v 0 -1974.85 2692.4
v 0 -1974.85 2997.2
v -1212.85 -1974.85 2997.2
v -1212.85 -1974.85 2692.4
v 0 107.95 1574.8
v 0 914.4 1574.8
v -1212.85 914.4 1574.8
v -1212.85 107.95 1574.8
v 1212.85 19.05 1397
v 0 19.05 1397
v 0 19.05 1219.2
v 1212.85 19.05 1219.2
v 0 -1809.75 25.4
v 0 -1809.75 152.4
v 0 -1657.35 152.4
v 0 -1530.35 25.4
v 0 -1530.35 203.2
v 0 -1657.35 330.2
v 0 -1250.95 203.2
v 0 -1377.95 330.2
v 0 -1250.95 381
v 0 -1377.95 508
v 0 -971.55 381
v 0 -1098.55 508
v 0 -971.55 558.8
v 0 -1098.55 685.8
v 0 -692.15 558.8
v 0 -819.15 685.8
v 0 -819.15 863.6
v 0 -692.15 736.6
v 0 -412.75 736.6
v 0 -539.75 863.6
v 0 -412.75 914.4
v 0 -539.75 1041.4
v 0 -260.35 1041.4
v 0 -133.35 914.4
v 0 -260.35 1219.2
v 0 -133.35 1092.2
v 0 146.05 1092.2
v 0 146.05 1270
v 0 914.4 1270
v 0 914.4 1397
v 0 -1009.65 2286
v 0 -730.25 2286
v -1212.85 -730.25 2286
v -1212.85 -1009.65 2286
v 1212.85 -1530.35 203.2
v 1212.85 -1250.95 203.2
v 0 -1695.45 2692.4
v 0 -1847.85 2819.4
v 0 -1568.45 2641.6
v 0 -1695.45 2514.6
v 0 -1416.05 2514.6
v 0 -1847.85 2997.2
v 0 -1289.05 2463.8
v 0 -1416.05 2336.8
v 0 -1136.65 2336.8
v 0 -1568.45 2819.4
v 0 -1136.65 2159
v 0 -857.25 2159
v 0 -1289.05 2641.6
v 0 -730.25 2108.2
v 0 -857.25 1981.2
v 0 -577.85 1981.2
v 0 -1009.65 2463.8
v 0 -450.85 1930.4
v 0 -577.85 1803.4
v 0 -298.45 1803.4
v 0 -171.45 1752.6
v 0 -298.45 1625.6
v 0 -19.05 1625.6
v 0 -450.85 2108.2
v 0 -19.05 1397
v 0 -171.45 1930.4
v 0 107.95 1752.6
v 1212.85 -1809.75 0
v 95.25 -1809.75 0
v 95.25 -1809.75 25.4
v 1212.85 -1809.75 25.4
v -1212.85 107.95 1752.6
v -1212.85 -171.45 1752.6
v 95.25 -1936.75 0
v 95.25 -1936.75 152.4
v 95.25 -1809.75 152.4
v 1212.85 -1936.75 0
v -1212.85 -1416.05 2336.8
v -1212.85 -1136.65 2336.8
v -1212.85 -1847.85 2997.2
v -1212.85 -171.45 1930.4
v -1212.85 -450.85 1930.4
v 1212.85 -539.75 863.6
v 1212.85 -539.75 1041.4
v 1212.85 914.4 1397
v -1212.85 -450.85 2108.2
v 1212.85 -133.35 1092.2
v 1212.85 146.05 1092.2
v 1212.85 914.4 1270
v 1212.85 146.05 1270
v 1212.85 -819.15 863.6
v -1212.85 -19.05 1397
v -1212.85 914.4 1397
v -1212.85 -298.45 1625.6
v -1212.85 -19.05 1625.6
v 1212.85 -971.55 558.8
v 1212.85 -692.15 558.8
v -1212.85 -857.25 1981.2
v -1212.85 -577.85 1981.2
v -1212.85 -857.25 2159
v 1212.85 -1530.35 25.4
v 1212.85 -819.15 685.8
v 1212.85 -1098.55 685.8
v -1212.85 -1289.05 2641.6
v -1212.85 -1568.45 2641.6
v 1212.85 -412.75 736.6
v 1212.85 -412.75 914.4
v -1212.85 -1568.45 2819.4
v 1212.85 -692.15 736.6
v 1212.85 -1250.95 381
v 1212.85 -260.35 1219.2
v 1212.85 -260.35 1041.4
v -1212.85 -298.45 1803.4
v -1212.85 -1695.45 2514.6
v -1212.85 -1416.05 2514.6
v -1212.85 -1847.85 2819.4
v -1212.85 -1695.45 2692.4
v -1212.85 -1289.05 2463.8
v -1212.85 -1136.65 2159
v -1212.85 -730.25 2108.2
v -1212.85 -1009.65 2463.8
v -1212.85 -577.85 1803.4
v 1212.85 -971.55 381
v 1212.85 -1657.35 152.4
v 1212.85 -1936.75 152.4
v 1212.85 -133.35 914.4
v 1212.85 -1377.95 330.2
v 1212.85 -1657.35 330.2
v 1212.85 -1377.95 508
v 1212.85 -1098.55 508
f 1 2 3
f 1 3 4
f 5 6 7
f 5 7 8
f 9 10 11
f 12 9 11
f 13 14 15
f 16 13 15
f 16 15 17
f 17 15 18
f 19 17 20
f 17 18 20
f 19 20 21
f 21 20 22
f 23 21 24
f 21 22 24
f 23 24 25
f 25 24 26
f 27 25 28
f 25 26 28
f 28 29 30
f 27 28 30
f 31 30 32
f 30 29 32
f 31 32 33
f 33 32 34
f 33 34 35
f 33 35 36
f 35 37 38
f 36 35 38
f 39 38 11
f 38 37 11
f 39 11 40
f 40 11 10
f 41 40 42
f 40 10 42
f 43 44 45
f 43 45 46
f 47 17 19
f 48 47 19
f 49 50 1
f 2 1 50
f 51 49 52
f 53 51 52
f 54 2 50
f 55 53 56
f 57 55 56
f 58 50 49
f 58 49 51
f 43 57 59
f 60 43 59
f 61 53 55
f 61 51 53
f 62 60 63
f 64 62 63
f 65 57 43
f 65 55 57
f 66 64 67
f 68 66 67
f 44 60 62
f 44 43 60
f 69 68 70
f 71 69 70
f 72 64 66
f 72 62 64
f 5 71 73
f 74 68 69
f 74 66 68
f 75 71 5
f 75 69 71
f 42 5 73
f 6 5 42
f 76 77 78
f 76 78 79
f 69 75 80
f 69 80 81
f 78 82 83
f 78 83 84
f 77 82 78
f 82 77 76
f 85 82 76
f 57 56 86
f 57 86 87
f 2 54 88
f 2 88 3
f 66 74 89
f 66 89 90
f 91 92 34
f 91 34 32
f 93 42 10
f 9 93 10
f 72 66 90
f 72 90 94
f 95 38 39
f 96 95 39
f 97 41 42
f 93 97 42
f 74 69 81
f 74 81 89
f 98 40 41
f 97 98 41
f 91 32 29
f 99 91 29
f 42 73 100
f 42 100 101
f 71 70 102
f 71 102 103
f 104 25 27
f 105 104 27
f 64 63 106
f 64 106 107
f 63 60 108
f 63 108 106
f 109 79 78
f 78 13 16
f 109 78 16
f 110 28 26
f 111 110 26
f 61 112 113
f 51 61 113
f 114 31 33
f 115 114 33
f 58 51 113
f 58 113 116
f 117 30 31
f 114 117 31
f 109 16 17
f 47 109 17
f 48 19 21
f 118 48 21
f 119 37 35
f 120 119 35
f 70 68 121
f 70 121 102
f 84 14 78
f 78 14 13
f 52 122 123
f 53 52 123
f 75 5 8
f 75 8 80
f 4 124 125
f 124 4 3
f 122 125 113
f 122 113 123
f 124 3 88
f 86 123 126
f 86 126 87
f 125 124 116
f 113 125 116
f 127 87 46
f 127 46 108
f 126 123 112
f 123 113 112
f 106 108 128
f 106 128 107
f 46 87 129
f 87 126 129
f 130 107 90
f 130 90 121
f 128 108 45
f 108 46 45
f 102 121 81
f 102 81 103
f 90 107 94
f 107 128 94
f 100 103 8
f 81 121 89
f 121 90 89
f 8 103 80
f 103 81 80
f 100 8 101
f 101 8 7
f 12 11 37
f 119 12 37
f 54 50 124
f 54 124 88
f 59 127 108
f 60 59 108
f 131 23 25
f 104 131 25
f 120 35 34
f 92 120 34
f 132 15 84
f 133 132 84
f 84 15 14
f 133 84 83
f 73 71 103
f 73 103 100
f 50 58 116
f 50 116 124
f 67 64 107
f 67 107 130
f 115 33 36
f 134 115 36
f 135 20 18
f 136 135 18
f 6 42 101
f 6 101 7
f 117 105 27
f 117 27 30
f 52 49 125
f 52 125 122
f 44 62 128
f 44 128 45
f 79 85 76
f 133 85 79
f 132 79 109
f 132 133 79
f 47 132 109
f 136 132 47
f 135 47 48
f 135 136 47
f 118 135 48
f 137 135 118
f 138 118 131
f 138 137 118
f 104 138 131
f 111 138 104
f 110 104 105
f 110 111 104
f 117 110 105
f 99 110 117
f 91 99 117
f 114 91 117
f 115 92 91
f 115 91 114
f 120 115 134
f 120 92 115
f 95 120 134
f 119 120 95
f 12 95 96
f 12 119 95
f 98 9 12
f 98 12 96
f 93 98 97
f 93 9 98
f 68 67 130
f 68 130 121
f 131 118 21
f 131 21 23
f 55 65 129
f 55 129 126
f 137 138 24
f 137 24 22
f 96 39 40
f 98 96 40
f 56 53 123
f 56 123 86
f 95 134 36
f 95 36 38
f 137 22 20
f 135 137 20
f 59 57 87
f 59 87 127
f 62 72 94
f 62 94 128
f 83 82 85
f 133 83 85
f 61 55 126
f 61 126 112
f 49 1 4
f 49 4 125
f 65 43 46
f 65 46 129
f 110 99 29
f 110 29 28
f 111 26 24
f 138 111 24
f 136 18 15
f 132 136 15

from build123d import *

# Parameters (mm, degrees)
F2_W     = 1117.6
F2_H     = 127
F3_DEPTH = 152.4
F5_DEPTH = 1212.85
F7_DEPTH = 1212.85


# Not quite as in the source:
# - a variable given as a bare number and used for a length is read in inches; the dataset says mm whatever the document's units were


with BuildPart() as f3:
    # F2 (on Top) → F3 (new body)
    with BuildSketch(Plane.XY):
        with Locations((654.05, -1873.25)):
            Rectangle(F2_W, F2_H)
    extrude(amount=F3_DEPTH)

    # F4 (on Right) → F5 (join)
    with BuildSketch(Plane.YZ):
        Polygon((-1657.35, 152.4), (-1809.75, 152.4), (-1809.75, 25.4), (-1530.35, 25.4), (-1530.35, 203.2), (-1250.95, 203.2), (-1250.95, 381), (-971.55, 381), (-971.55, 558.8), (-692.15, 558.8), (-692.15, 736.6), (-412.75, 736.6), (-412.75, 914.4), (-133.35, 914.4), (-133.35, 1092.2), (146.05, 1092.2), (146.05, 1270), (914.4, 1270), (914.4, 1397), (19.05, 1397), (19.05, 1219.2), (-260.35, 1219.2), (-260.35, 1041.4), (-539.75, 1041.4), (-539.75, 863.6), (-819.15, 863.6), (-819.15, 685.8), (-1098.55, 685.8), (-1098.55, 508), (-1377.95, 508), (-1377.95, 330.2), (-1657.35, 330.2), align=None)
    extrude(amount=F5_DEPTH)


with BuildPart() as f7:
    # F6 (on Right) → F7 (new body)
    with BuildSketch(Plane.YZ):
        Polygon((-19.05, 1397), (914.4, 1397), (914.4, 1574.8), (107.95, 1574.8), (107.95, 1752.6), (-171.45, 1752.6), (-171.45, 1930.4), (-450.85, 1930.4), (-450.85, 2108.2), (-730.25, 2108.2), (-730.25, 2286), (-1009.65, 2286), (-1009.65, 2463.8), (-1289.05, 2463.8), (-1289.05, 2641.6), (-1568.45, 2641.6), (-1568.45, 2819.4), (-1847.85, 2819.4), (-1847.85, 2997.2), (-1974.85, 2997.2), (-1974.85, 2692.4), (-1695.45, 2692.4), (-1695.45, 2514.6), (-1416.05, 2514.6), (-1416.05, 2336.8), (-1136.65, 2336.8), (-1136.65, 2159), (-857.25, 2159), (-857.25, 1981.2), (-577.85, 1981.2), (-577.85, 1803.4), (-298.45, 1803.4), (-298.45, 1625.6), (-19.05, 1625.6), align=None)
    extrude(amount=-F7_DEPTH)


solid = Compound([f3.part, f7.part])
